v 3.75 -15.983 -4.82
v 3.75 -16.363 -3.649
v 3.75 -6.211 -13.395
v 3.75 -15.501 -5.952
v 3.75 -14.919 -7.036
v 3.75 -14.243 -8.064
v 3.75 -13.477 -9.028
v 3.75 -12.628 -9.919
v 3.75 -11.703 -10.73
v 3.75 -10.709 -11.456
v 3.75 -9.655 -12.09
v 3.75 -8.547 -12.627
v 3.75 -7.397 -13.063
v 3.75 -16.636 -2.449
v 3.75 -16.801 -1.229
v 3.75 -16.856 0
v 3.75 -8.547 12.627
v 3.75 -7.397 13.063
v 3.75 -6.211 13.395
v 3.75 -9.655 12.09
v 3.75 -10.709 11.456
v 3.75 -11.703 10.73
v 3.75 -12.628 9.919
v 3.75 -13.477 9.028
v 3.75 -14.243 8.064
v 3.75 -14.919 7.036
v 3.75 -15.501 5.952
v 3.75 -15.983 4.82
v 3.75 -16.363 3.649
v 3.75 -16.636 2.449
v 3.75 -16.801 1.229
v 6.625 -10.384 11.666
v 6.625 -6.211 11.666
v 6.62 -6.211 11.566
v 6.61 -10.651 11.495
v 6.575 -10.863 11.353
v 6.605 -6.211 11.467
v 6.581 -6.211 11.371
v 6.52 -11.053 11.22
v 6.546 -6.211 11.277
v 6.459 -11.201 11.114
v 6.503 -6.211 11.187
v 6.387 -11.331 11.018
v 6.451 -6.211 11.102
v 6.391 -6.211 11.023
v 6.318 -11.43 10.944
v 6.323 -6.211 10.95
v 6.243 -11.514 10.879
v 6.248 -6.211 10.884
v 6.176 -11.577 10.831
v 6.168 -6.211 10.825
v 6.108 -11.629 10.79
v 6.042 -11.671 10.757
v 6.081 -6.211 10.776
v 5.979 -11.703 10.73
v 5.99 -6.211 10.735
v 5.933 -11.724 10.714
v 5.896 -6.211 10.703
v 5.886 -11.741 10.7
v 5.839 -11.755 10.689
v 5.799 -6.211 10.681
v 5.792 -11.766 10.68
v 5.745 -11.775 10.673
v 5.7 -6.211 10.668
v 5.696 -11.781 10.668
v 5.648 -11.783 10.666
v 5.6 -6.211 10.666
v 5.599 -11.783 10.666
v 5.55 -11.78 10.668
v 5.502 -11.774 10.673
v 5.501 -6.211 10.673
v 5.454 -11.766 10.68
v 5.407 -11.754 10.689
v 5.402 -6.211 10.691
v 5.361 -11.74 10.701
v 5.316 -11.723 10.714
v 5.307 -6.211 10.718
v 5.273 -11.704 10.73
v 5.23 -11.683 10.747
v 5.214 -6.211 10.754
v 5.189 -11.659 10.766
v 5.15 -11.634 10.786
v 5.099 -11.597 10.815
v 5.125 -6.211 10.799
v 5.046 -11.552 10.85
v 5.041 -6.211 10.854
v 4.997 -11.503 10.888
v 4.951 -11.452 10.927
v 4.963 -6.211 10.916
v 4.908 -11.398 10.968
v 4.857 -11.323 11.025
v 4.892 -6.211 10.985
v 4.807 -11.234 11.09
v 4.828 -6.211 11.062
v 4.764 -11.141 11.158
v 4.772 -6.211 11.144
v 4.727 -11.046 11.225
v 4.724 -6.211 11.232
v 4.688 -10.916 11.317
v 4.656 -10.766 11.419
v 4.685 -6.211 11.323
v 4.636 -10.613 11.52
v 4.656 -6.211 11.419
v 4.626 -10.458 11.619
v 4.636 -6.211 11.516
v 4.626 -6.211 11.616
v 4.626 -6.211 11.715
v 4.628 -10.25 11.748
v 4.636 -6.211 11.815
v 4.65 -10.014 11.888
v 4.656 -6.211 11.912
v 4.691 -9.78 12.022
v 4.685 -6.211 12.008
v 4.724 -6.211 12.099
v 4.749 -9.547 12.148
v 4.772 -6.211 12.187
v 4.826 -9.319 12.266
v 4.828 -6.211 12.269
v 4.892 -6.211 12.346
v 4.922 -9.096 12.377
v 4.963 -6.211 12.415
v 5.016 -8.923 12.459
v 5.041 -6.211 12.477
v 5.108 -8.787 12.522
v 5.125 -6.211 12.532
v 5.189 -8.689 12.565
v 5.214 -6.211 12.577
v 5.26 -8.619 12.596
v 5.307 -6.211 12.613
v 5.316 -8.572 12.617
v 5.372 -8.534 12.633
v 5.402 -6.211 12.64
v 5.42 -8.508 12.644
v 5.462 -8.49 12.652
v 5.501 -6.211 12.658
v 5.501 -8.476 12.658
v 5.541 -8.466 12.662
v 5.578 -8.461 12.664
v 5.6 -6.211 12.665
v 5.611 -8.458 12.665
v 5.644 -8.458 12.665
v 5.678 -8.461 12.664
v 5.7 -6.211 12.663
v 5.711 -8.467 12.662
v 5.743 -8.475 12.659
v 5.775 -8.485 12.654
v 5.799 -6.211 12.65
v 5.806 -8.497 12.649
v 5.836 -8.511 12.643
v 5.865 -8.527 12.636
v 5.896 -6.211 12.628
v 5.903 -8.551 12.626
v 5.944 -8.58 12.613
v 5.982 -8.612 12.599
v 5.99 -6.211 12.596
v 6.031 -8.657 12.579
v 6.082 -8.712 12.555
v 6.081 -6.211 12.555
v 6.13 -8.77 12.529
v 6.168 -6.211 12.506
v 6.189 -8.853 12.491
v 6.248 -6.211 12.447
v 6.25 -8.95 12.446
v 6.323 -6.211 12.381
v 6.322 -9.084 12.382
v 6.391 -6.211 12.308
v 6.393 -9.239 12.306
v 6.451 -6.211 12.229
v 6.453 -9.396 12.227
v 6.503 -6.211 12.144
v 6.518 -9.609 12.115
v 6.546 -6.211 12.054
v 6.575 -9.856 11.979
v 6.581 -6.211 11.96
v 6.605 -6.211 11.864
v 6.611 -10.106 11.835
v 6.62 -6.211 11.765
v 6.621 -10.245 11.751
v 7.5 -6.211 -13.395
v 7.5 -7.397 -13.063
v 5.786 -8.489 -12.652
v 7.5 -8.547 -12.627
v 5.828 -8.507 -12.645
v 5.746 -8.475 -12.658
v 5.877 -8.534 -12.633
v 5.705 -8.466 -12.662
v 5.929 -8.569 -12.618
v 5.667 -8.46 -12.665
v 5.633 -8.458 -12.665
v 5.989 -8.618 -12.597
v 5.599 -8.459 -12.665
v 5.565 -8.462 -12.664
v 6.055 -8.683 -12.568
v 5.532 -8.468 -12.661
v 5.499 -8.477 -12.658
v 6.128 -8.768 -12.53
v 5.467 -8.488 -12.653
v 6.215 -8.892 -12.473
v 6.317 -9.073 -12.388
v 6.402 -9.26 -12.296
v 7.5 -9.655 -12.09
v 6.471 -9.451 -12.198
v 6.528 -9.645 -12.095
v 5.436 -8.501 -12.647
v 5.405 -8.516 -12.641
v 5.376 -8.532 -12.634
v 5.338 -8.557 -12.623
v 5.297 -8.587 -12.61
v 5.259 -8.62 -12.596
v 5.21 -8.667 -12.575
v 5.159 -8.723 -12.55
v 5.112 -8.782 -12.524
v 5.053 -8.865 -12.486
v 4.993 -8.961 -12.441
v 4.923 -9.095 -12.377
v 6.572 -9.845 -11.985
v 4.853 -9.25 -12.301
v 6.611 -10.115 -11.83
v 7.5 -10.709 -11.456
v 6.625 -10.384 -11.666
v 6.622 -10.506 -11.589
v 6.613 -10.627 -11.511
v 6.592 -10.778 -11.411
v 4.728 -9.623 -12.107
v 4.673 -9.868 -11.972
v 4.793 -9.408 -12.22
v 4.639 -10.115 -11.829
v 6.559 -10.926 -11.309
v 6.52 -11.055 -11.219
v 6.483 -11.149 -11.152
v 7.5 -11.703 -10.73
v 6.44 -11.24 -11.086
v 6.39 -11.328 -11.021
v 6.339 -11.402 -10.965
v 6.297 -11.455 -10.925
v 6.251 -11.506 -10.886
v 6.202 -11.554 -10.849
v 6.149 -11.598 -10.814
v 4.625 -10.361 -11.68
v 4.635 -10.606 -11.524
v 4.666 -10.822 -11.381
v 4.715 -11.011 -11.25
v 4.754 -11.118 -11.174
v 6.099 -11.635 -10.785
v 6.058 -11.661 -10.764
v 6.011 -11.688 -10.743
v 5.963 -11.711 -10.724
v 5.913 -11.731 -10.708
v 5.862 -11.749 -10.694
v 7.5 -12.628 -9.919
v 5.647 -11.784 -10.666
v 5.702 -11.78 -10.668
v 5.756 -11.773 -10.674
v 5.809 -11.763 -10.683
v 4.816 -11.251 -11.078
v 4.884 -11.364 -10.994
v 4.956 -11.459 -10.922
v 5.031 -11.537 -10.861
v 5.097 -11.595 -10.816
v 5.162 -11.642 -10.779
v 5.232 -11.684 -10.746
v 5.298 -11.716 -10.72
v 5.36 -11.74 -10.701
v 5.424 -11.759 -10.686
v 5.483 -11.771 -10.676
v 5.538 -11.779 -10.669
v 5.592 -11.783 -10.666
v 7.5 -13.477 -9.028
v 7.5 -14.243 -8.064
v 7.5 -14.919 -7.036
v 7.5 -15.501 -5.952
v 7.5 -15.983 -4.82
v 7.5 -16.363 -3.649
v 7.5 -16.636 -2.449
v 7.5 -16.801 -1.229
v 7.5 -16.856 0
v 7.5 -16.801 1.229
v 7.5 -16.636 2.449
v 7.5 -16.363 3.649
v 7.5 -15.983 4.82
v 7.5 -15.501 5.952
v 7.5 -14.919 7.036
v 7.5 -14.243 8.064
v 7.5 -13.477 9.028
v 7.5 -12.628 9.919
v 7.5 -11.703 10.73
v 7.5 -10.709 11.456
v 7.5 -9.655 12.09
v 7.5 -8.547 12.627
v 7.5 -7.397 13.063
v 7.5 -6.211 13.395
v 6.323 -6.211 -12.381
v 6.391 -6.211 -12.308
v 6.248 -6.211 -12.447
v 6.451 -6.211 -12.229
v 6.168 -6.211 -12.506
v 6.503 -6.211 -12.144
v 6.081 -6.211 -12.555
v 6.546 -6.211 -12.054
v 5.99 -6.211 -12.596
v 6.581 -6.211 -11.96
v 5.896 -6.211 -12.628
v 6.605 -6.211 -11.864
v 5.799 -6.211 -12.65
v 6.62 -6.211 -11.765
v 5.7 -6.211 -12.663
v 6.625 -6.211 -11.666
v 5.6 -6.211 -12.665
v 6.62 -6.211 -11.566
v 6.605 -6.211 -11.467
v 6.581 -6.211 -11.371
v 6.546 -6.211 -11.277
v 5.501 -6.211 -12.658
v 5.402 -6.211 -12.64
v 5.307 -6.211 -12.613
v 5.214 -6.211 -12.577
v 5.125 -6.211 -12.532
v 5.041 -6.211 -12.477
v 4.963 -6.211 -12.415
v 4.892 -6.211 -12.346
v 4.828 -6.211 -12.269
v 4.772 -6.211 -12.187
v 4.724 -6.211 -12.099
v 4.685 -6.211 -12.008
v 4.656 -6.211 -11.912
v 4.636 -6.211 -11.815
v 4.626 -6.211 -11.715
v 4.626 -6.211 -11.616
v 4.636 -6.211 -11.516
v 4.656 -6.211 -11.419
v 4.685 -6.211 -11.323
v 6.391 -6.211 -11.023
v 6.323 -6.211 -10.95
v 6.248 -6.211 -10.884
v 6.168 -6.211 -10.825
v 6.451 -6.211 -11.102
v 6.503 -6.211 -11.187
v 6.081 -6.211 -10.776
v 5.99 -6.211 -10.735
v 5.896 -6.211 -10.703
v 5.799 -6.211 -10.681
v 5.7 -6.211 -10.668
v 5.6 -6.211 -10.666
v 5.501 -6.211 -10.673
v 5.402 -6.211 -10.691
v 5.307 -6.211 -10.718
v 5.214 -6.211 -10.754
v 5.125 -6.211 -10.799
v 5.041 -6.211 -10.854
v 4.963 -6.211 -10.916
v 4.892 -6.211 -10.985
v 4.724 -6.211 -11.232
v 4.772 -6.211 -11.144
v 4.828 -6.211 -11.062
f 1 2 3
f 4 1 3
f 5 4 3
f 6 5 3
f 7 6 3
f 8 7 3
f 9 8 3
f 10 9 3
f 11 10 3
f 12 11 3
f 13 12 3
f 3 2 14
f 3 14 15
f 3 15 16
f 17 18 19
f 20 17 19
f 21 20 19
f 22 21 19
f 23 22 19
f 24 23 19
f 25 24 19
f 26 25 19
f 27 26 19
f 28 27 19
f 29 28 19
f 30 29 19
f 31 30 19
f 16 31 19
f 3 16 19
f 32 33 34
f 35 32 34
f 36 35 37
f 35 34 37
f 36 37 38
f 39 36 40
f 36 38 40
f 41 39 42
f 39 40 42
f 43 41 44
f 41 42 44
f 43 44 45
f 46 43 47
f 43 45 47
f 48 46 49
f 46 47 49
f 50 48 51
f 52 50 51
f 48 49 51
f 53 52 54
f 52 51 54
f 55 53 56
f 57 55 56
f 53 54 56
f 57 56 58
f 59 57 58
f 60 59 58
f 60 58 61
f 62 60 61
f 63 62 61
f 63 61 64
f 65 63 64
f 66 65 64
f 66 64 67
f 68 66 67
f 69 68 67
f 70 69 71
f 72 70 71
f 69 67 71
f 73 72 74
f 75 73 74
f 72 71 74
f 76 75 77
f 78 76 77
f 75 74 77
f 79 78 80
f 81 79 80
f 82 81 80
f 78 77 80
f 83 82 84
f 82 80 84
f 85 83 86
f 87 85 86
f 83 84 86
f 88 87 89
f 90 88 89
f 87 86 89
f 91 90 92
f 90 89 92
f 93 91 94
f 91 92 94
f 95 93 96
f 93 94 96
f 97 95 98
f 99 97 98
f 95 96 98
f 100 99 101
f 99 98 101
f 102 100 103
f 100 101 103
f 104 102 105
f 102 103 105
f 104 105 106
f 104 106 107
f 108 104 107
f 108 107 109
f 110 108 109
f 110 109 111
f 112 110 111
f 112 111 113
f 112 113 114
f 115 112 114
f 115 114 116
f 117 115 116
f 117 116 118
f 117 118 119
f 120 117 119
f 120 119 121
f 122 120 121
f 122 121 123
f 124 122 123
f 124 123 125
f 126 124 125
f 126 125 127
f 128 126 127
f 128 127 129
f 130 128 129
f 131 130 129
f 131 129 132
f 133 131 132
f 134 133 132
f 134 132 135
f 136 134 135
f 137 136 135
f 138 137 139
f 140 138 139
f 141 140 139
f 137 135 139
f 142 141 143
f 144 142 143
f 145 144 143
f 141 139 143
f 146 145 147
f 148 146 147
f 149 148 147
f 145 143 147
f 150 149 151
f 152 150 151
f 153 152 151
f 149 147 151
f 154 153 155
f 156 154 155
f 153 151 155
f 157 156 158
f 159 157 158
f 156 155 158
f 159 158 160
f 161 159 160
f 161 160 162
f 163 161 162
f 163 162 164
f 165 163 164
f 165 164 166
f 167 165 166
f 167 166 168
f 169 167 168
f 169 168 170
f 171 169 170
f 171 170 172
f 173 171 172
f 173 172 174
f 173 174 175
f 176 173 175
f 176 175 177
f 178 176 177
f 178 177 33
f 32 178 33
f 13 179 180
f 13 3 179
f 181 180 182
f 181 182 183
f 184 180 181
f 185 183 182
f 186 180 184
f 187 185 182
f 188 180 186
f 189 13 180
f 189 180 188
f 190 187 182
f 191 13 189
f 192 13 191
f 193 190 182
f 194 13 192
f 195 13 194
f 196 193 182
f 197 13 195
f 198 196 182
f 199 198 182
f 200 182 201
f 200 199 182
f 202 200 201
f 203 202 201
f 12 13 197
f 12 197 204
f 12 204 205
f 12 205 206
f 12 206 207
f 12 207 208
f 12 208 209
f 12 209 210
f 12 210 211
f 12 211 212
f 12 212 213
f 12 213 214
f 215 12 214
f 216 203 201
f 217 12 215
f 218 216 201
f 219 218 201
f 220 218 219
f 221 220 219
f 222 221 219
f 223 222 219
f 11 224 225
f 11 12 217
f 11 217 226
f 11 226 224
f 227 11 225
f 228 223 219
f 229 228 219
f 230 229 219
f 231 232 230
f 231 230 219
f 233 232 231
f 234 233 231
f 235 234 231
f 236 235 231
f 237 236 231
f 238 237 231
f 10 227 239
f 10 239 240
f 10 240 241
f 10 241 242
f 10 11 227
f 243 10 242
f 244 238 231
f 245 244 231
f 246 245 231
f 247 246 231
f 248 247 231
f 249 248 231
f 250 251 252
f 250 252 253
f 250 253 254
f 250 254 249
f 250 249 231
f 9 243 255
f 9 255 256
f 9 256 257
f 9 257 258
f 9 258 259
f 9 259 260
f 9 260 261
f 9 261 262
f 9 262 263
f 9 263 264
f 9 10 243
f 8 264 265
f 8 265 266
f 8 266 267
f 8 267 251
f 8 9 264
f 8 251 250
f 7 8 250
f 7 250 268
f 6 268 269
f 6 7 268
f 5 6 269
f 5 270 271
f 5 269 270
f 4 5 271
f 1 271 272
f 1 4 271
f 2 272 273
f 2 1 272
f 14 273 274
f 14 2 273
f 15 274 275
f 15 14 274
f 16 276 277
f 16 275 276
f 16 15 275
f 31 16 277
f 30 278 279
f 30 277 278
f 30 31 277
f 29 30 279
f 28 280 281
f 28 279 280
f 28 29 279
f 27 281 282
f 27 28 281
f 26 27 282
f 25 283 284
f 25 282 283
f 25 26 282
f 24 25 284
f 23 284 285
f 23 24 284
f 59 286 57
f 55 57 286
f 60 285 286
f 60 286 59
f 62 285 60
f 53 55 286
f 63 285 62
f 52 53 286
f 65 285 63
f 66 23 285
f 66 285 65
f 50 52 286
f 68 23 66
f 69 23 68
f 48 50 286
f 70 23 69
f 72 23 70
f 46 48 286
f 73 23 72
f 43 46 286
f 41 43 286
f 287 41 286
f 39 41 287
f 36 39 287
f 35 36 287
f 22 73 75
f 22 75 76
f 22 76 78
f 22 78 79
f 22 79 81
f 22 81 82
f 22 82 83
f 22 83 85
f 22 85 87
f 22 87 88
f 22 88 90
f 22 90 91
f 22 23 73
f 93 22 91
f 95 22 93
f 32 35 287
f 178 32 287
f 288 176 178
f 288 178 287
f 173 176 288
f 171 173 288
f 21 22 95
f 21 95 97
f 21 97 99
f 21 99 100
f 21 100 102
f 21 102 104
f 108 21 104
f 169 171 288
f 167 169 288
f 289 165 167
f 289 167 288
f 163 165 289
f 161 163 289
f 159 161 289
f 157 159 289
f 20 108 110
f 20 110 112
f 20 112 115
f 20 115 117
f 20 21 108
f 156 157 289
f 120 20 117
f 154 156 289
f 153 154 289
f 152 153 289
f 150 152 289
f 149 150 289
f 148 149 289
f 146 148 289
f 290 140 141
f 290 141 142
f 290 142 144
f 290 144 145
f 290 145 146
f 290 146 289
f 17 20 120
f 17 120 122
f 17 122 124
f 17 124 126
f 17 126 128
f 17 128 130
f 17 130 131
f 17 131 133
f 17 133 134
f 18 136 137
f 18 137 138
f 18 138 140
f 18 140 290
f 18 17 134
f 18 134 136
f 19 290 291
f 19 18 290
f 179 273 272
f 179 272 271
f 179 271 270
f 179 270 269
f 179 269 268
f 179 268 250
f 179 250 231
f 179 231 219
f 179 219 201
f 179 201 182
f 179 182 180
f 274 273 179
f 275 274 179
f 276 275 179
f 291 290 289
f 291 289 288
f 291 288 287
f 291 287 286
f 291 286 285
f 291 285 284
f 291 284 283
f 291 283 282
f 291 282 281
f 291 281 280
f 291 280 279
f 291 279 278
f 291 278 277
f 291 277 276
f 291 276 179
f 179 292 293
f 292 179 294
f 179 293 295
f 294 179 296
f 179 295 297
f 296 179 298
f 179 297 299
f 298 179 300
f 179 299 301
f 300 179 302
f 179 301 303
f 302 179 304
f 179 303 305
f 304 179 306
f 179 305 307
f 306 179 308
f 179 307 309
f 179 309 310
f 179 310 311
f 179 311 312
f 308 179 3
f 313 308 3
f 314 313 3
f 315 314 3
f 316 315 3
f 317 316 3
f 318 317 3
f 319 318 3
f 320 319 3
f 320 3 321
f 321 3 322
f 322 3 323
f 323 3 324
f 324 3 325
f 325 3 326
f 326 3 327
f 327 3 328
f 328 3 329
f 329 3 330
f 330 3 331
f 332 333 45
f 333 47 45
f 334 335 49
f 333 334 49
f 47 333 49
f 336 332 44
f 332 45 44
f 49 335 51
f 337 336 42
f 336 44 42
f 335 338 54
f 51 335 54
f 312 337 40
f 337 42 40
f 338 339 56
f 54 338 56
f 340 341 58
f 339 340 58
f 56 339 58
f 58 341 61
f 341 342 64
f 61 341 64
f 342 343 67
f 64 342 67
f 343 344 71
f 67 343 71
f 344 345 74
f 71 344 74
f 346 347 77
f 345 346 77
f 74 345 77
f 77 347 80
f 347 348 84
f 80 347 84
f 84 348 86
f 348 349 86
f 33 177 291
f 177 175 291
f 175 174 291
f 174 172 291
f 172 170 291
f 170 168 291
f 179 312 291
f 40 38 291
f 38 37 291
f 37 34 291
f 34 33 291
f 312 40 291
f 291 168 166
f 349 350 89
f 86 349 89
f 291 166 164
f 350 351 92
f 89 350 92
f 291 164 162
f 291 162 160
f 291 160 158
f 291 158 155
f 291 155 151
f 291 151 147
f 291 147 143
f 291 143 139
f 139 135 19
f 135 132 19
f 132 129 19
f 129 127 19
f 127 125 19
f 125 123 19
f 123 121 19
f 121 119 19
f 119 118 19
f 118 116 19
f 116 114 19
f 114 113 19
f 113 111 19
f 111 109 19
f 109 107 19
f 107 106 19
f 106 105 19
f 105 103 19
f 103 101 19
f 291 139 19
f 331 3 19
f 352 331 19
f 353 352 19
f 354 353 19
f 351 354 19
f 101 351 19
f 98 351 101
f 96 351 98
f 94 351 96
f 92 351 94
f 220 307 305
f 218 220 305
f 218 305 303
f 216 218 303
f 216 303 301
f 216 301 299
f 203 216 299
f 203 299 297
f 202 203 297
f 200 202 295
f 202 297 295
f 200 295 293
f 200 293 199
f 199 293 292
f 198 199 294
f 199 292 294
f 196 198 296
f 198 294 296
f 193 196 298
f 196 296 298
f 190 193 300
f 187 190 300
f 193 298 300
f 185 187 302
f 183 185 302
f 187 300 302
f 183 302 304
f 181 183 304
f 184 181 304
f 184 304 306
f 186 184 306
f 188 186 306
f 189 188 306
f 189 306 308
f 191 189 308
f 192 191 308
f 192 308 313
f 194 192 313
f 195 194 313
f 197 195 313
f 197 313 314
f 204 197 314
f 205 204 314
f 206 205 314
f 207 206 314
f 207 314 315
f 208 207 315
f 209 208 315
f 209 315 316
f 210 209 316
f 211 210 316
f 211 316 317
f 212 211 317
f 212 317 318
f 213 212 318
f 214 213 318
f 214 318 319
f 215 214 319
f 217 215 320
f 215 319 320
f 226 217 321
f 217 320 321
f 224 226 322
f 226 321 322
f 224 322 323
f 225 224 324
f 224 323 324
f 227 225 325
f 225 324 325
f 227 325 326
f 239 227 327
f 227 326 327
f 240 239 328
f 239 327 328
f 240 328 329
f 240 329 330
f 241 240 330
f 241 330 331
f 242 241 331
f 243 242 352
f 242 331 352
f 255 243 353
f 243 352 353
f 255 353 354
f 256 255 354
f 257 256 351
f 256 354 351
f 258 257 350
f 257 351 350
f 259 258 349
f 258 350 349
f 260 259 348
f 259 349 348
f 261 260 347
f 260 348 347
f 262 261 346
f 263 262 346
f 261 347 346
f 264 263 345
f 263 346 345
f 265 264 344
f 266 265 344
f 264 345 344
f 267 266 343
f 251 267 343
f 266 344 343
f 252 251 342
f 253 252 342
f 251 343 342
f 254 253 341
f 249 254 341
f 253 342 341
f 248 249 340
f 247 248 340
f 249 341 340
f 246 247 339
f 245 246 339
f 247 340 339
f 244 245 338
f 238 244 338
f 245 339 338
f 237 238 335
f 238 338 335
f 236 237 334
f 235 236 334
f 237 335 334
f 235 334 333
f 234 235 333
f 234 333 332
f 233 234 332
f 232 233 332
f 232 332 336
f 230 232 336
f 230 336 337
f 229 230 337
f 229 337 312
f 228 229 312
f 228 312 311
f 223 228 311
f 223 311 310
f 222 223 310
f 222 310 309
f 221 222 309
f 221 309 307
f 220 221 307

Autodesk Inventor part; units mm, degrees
ref_plane "YZ Plane" through (0, 0, 0) normal (1, 0, 0) x (0, 1, 0)
ref_plane "XZ Plane" through (0, 0, 0) normal (0, 1, 0) x (-1, 0, 0)
ref_plane "XY Plane" through (0, 0, 0) normal (0, 0, 1) x (1, 0, 0)
sketch "Sketch1" plane through (0, 0, 0) normal (1, 0, 0) x (0, 1, 0)
  arc A0 (-1.2115, 27.4733) -> (-1.2115, -27.4733) centre (0, 0) ccw
  line L0 (-1.2115, -27.4733) -> (-6.2115, -27.4733)
  line L1 (-6.2115, -27.4733) -> (-6.2115, 27.4733)
  line L2 (-6.2115, 27.4733) -> (-1.2115, 27.4733)
  line L3 (-6.2115, -26.7893) -> (-6.2115, 26.7893)
  line L4 (-6.2115, 0) -> (-6.2115, 26.7893)
  circle A1 centre (0, 0) radius 27.5
  point P0 (5.2115, 24.6247)
  dimension "d0" = 5
  dimension "d1" = 53.5786
extrude "Extrusion1" add sketch "Sketch1" along normal blind 7.5 contours L1 A0
sketch "Sketch2" plane through (0, -6.2115, 26.7893) normal (0, 1, 0) x (1, 0, 0)
  line L0 (0, 6.9167) -> (7.5, 6.9167)
  line L1 (0, 0) -> (0, 6.9167)
  line L2 (0, 6.9167) -> (7.5, 6.9167)
  line L3 (7.5, 26.7893) -> (7.5, 0)
  line L4 (7.5, 6.9167) -> (7.5, 0)
  line L5 (7.5, 0) -> (0, 0)
  line L6 (7.5, 0) -> (0, 0)
  circle A0 centre (3.75, 3.4583) radius 1
  line L7 (0, 0) -> (0, 53.5786)
  line L8 (0, 53.5786) -> (0, 0)
  line L9 (0, 26.7893) -> (7.5, 26.7893)
  circle A1 centre (3.75, 50.1203) radius 1
  circle A2 centre (3.75, 3.4583) radius 2
  circle A3 centre (3.75, 50.1203) radius 2
  line L10 (0, 6.9167) -> (7.5, 6.9167)
  line L11 (0, 0) -> (0, 6.9167)
  line L12 (0, 6.9167) -> (7.5, 6.9167)
  line L13 (7.5, 26.7893) -> (7.5, 0)
  line L14 (7.5, 6.9167) -> (7.5, 0)
  line L15 (7.5, 0) -> (0, 0)
  line L16 (7.5, 0) -> (0, 0)
  line L17 (0, 0) -> (2.2798, 2.1025)
  line L18 (5.2202, 4.8142) -> (7.5, 6.9167)
  line L19 (0, 6.9167) -> (2.2798, 4.8142)
  line L20 (5.2202, 2.1025) -> (7.5, 0)
  line L21 (0, 0) -> (0, 53.5786)
  line L22 (0, 53.5786) -> (0, 0)
  line L23 (0, 26.7893) -> (7.5, 26.7893)
  circle A4 centre (3.75, 50.1203) radius 1
  line L24 (0, 53.5786) -> (7.5, 53.5786)
  line L25 (7.5, 53.5786) -> (7.5, 0)
  circle A5 centre (3.75, 50.1203) radius 2
  circle A6 centre (3.75, 3.4583) radius 2
  point P0 (0, 26.7893)
  point P1 (280.32, 51.414)
  point P2 (4.4851, 4.1363)
  point P3 (4.4851, 2.7804)
  point P4 (3.0149, 4.1363)
  point P5 (3.0149, 2.7804)
  point P6 (280.32, 51.414)
  dimension "d6" = 2
  dimension "d9" = 4
  dimension "d10" = 4
  dimension "d13" = 4
  dimension "d14" = 4
extrude "Extrusion2" cut sketch "Sketch2" against normal blind 10 contours A0 | A1
extrude "Extrusion3" cut sketch "Sketch2" against normal blind 13.175 contours A2 | A3
scale "Scale1" factors (0.5, 0.5, 0.5) then translate (3.75, -3.1057, 0) bodies 1
properties part number "Contrapeso1"
